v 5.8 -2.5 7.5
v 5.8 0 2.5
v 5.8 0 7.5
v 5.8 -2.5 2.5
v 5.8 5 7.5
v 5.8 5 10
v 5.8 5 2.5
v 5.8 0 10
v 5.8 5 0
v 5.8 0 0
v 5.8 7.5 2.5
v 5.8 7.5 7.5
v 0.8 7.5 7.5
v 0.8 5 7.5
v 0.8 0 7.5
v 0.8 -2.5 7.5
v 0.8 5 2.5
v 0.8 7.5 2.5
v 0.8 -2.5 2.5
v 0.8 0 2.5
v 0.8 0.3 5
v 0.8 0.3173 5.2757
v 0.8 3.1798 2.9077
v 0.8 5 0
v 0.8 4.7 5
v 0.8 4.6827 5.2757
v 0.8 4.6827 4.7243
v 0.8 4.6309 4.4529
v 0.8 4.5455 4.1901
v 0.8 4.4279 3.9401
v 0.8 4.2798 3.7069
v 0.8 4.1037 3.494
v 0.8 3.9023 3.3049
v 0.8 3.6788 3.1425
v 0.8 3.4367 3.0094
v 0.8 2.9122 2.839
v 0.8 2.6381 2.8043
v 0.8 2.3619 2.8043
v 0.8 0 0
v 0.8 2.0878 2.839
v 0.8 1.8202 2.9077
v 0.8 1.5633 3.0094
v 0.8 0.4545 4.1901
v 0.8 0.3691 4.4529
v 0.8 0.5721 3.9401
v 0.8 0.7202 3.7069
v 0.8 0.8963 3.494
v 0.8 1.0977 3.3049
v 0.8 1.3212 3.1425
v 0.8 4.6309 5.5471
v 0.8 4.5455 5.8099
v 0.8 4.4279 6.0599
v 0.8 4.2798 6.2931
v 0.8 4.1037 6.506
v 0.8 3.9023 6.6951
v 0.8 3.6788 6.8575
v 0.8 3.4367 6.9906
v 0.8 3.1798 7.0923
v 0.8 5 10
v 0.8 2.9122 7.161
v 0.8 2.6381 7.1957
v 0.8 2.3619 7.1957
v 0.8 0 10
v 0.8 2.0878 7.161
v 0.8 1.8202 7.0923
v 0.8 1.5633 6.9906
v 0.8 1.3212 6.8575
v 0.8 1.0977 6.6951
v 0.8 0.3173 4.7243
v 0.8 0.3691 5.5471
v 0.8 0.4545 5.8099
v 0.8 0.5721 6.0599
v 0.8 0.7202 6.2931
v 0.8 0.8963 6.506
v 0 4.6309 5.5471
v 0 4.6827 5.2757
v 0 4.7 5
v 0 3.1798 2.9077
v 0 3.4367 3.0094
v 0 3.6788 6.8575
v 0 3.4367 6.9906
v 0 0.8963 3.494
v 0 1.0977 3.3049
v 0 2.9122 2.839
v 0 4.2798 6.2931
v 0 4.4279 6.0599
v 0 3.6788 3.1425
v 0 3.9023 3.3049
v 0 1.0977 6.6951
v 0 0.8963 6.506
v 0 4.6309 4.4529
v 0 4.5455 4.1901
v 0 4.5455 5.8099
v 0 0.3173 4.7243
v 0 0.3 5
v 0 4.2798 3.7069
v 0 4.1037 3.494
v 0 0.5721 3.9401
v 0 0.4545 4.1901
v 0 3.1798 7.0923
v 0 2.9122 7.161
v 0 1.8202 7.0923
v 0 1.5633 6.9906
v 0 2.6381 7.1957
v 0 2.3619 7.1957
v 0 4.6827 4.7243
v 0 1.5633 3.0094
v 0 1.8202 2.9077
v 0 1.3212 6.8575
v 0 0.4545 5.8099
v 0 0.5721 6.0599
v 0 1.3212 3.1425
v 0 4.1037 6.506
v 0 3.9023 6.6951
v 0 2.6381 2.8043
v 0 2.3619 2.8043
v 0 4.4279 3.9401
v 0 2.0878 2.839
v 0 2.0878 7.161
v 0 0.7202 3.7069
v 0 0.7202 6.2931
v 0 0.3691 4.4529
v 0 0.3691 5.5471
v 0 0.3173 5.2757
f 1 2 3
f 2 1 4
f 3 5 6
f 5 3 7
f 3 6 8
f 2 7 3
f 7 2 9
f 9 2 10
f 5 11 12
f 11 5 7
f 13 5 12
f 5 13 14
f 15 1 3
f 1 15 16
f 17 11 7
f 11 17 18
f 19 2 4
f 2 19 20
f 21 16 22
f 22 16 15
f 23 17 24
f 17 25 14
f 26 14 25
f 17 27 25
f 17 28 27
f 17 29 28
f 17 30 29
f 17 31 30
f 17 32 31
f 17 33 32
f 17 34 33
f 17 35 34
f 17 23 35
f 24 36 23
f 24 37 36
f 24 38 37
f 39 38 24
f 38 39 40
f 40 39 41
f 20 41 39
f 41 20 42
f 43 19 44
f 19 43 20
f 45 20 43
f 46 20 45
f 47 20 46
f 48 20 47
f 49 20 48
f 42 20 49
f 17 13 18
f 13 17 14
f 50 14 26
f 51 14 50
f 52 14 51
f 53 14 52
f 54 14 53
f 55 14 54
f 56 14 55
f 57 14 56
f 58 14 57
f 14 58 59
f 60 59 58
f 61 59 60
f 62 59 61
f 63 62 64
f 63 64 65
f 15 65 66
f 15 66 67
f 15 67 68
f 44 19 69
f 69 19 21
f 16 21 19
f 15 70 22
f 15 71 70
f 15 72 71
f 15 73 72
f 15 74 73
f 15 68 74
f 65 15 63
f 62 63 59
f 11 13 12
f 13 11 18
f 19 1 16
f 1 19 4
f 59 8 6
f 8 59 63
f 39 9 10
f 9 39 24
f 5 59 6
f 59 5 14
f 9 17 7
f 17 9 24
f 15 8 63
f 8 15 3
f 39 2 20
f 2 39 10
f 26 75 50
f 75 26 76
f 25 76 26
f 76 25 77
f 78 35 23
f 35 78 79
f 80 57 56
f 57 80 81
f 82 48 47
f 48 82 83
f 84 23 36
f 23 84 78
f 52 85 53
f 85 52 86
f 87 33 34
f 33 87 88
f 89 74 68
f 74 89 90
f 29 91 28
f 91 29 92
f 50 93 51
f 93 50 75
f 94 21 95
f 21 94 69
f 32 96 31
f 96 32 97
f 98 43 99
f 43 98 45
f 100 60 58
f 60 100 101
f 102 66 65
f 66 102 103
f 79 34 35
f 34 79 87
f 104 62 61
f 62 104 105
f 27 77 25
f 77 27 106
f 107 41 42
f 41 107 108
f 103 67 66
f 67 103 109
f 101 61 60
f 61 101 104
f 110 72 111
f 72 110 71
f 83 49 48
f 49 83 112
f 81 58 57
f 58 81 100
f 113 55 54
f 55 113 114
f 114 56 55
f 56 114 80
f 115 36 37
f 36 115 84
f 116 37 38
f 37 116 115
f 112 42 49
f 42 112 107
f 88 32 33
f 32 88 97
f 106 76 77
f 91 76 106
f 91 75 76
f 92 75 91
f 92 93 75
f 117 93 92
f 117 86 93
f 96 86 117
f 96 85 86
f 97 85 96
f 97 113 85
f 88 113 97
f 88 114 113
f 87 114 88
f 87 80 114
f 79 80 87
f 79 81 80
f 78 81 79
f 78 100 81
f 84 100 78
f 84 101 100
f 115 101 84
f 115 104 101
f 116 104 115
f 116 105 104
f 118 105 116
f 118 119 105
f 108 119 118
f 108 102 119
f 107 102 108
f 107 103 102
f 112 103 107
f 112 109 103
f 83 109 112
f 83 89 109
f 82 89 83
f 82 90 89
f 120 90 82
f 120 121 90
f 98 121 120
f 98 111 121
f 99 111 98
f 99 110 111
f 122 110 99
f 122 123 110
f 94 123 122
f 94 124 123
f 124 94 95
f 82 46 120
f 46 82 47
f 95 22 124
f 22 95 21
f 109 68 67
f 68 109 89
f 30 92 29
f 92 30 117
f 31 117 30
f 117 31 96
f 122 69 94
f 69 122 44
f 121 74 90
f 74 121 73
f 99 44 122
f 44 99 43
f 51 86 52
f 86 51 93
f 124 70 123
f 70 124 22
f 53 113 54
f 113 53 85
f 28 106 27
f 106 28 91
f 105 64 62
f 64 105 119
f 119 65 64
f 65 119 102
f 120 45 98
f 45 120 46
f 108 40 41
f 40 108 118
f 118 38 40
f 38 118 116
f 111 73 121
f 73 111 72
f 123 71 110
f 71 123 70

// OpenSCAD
$fn=50;

size_pegboard=0.8;
size_hole=4.4;

translate([size_pegboard, 0, 0])
union()
{
    translate([0, -2.5, 2.5])
    cube([5, 10, 5]);
    
    cube([5, 5, 10]);
    
    rotate([90, 0, 90])
    translate([2.5, 5, -size_pegboard])
    cylinder(size_pegboard, size_hole / 2, size_hole / 2);
}
